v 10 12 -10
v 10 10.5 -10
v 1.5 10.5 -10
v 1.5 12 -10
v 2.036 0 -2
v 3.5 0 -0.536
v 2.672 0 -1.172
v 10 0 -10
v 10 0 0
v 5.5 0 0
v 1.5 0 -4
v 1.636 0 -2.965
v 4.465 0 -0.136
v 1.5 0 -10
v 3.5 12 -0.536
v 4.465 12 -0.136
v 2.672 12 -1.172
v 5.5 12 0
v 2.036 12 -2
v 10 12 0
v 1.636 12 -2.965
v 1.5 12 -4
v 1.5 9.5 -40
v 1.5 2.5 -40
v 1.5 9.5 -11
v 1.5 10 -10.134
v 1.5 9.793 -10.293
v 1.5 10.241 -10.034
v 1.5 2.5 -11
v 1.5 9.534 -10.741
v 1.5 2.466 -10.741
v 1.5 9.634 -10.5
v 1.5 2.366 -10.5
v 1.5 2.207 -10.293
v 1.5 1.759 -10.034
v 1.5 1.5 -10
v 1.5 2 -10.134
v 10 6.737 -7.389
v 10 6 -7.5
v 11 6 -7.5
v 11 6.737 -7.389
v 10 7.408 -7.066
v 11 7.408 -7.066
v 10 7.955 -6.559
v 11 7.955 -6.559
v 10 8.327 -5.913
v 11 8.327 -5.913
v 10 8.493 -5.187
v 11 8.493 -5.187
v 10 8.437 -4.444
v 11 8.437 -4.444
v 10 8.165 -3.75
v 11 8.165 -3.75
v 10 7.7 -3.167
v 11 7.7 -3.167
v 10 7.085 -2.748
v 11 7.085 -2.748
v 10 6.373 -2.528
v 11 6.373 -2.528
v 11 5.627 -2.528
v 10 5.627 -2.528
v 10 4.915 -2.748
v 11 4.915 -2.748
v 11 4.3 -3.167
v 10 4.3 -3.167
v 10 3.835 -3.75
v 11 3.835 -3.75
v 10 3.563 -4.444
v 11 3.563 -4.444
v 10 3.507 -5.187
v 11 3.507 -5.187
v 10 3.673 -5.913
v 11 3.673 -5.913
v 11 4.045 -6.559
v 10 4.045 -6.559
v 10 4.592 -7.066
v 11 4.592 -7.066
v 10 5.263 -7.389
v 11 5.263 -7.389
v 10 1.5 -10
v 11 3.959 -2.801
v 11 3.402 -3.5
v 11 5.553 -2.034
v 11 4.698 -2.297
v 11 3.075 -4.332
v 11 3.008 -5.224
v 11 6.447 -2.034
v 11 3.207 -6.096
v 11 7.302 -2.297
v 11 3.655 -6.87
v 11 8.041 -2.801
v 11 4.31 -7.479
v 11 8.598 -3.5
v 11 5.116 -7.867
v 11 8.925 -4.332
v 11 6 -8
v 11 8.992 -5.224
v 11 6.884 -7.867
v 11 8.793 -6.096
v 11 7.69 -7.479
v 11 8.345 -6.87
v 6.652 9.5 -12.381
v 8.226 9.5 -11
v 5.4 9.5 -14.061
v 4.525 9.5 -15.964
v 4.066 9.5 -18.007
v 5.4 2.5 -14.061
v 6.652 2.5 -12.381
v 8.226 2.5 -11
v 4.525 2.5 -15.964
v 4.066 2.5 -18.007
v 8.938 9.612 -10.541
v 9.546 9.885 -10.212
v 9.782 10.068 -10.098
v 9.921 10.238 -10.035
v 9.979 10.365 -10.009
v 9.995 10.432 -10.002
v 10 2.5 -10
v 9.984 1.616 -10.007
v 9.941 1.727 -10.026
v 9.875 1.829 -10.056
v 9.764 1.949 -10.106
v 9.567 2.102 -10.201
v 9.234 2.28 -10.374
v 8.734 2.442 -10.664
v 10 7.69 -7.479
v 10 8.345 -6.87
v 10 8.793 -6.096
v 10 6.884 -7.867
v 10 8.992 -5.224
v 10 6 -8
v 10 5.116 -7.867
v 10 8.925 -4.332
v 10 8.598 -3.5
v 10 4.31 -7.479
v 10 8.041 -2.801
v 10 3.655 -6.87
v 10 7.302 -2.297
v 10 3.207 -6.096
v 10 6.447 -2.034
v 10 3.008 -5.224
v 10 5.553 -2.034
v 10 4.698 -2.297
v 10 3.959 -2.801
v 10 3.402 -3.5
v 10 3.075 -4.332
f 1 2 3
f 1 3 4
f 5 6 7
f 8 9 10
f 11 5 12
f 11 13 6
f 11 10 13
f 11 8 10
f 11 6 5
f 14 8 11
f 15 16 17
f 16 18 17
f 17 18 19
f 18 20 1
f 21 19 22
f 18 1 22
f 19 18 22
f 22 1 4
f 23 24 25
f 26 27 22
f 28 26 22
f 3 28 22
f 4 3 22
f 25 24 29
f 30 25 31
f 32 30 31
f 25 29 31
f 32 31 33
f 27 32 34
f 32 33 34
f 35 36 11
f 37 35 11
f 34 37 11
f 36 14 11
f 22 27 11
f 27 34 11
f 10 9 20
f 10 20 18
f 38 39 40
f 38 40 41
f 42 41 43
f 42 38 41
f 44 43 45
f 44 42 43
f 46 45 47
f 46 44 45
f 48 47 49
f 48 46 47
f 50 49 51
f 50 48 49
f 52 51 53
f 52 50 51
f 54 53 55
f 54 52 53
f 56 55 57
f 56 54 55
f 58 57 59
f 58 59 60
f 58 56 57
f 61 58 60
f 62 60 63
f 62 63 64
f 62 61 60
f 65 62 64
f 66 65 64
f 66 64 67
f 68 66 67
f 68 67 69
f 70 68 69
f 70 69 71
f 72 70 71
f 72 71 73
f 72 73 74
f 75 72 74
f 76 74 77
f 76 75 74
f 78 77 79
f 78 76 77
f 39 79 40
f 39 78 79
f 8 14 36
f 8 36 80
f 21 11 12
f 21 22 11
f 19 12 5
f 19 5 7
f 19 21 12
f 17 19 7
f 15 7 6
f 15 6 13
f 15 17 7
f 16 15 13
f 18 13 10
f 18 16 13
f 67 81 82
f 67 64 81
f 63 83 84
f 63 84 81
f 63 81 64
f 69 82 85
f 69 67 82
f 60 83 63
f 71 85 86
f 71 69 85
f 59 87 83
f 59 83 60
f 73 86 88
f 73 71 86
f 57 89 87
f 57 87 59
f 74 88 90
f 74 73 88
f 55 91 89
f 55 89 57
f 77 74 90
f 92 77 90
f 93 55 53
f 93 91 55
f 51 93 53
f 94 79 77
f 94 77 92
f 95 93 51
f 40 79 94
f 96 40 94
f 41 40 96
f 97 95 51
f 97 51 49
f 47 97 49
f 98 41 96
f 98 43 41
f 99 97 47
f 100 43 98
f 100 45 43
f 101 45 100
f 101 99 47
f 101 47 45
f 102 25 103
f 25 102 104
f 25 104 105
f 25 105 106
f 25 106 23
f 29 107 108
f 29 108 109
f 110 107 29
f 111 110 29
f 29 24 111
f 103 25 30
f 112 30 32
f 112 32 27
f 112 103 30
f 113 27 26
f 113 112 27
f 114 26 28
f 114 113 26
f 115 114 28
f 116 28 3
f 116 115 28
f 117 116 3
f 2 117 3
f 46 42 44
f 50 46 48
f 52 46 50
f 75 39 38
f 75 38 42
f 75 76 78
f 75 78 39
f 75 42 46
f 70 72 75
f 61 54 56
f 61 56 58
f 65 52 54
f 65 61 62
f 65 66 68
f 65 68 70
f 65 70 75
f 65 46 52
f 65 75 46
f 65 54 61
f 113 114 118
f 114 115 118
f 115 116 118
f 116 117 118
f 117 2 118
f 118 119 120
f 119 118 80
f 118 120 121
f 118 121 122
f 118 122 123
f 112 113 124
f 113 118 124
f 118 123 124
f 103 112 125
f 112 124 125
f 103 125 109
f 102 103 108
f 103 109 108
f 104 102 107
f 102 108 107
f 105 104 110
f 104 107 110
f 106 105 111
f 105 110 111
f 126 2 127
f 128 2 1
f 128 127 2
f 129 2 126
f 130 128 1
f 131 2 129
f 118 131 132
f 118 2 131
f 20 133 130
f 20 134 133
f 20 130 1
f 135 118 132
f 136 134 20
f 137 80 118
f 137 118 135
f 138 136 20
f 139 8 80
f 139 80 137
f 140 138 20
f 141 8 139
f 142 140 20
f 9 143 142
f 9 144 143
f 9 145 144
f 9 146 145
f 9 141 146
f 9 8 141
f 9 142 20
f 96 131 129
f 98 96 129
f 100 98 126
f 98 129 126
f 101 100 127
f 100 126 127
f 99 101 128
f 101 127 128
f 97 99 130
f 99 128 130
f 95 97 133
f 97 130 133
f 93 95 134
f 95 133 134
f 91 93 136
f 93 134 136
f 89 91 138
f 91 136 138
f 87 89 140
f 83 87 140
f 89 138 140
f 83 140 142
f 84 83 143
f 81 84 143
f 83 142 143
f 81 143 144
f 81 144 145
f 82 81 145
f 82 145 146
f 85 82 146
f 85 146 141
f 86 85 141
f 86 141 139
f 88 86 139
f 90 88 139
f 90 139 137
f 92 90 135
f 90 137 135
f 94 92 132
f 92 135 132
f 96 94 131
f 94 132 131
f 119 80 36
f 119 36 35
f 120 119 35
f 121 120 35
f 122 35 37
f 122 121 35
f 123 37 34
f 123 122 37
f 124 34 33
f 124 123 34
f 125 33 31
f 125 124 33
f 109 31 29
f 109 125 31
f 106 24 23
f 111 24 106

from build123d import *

# Parameters (mm, degrees)
BOSS_EXTRUDE1_DEPTH = 12
SKETCH2_W           = 30
SKETCH2_H           = 2.5
CUT_EXTRUDE1_DEPTH  = 10
FILLET1_R           = 10
FILLET2_R           = 4
SKETCH5_W           = 57.951370105
SKETCH5_H           = 2.5
CUT_EXTRUDE2_DEPTH  = 43.617484675
FILLET3_R           = 1
FILLET4_R           = 1
SKETCH6_R           = 3
SKETCH6_R_2         = 2.5
BOSS_EXTRUDE2_DEPTH = 1


with BuildPart() as part:
    # Sketch1 → Boss-Extrude1 (new body)
    with BuildSketch(Plane(origin=(0, 0, 0), x_dir=(1, 0, 0), z_dir=(0, 1, 0))):
        Polygon((10, 0), (1.5, 0), (1.5, 40), (5, 10), (10, 10), align=None)
    extrude(amount=BOSS_EXTRUDE1_DEPTH)

    # Sketch2 → Cut-Extrude1 (cut)
    with BuildSketch(Plane.ZY.offset(-1.5)):
        with Locations((-25, 1.25)):
            Rectangle(SKETCH2_W, SKETCH2_H)
    extrude(amount=-CUT_EXTRUDE1_DEPTH, mode=Mode.SUBTRACT)

    # Fillet1
    # the kernel refuses this fillet: 10 mm, written as the material it adds along each edge
    with BuildSketch(Plane(origin=(5, 2.5, -10), x_dir=(1, 0, 0), z_dir=(0, 1, 0))) as fillet1_piece_1:
        with BuildLine():
            CenterArc((8.998480528, 9.165814392), FILLET1_R, 186.654425046, 59.776895084)
            Line((-0.934150863, 8.007007396), (-1.132803491, 7.983831256))
            Line((-1.132803491, 7.983831256), (-0.198652628, -0.02317614))
            Line((-0.198652628, -0.02317614), (0, -0.2))
            ThreePointArc((0, -0.2), (2.5, -0.2), (4.920030389, -0.183316288))
            Line((4.920030389, -0.183316288), (5, 0))
        make_face()
    extrude(amount=9.5)

    # Fillet2
    fillet2_edges = [part.edges().sort_by_distance(p)[0] for p in [
        (1.5, 6, 0),
    ]]
    fillet(fillet2_edges, radius=FILLET2_R)

    # Sketch5 → Cut-Extrude2 (cut, through all)
    with BuildSketch(Plane(origin=(10, 0, 0), x_dir=(0, 0, -1), z_dir=(1, 0, 0))):
        with Locations((38.975685053, 10.75)):
            Rectangle(SKETCH5_W, SKETCH5_H)
    extrude(amount=-CUT_EXTRUDE2_DEPTH, mode=Mode.SUBTRACT)

    # Fillet3
    # the kernel refuses this fillet: 1 mm, written as the material it adds along each edge
    with BuildSketch(Plane(origin=(10, 9.5, -10), x_dir=(0, 1, 0), z_dir=(-1, 0, 0))) as fillet3_piece_1_section:
        with BuildLine():
            CenterArc((FILLET3_R, FILLET3_R), FILLET3_R, 180, 90)
            Line((0, FILLET3_R), (0, 0))
            Line((0, 0), (FILLET3_R, 0))
        make_face()
    fillet3_piece_1 = extrude(amount=8.5, mode=Mode.PRIVATE)
    fillet3_piece_1 = fillet3_piece_1 - Plane(origin=(13.998480528, 9.732981391, -19.165814392), x_dir=(1, 0, 0), z_dir=(0, -1, 0)) * Cylinder(10, 22, mode=Mode.PRIVATE)
    add(fillet3_piece_1)

    # Fillet4
    # the kernel refuses this fillet: 1 mm, written as the material it adds along each edge
    with BuildSketch(Plane(origin=(10, 2.5, -10), x_dir=(0, 0, -1), z_dir=(-1, 0, 0))) as fillet4_piece_1_section:
        with BuildLine():
            CenterArc((FILLET4_R, FILLET4_R), FILLET4_R, 180, 90)
            Line((0, FILLET4_R), (0, 0))
            Line((0, 0), (FILLET4_R, 0))
        make_face()
    fillet4_piece_1 = extrude(amount=8.5, mode=Mode.PRIVATE)
    fillet4_piece_1 = fillet4_piece_1 - Plane(origin=(13.998480528, 2.267019068, -19.165814392), x_dir=(1, 0, 0), z_dir=(0, -1, 0)) * Cylinder(10, 21, mode=Mode.PRIVATE)
    add(fillet4_piece_1)

    # Sketch6 → Boss-Extrude2 (add)
    with BuildSketch(Plane(origin=(10, 0, 0), x_dir=(0, 0, -1), z_dir=(1, 0, 0))):
        with Locations((5, 6)):
            Circle(SKETCH6_R)
        with Locations((5, 6)):
            Circle(SKETCH6_R_2, mode=Mode.SUBTRACT)
    extrude(amount=BOSS_EXTRUDE2_DEPTH)


solid = part.part
